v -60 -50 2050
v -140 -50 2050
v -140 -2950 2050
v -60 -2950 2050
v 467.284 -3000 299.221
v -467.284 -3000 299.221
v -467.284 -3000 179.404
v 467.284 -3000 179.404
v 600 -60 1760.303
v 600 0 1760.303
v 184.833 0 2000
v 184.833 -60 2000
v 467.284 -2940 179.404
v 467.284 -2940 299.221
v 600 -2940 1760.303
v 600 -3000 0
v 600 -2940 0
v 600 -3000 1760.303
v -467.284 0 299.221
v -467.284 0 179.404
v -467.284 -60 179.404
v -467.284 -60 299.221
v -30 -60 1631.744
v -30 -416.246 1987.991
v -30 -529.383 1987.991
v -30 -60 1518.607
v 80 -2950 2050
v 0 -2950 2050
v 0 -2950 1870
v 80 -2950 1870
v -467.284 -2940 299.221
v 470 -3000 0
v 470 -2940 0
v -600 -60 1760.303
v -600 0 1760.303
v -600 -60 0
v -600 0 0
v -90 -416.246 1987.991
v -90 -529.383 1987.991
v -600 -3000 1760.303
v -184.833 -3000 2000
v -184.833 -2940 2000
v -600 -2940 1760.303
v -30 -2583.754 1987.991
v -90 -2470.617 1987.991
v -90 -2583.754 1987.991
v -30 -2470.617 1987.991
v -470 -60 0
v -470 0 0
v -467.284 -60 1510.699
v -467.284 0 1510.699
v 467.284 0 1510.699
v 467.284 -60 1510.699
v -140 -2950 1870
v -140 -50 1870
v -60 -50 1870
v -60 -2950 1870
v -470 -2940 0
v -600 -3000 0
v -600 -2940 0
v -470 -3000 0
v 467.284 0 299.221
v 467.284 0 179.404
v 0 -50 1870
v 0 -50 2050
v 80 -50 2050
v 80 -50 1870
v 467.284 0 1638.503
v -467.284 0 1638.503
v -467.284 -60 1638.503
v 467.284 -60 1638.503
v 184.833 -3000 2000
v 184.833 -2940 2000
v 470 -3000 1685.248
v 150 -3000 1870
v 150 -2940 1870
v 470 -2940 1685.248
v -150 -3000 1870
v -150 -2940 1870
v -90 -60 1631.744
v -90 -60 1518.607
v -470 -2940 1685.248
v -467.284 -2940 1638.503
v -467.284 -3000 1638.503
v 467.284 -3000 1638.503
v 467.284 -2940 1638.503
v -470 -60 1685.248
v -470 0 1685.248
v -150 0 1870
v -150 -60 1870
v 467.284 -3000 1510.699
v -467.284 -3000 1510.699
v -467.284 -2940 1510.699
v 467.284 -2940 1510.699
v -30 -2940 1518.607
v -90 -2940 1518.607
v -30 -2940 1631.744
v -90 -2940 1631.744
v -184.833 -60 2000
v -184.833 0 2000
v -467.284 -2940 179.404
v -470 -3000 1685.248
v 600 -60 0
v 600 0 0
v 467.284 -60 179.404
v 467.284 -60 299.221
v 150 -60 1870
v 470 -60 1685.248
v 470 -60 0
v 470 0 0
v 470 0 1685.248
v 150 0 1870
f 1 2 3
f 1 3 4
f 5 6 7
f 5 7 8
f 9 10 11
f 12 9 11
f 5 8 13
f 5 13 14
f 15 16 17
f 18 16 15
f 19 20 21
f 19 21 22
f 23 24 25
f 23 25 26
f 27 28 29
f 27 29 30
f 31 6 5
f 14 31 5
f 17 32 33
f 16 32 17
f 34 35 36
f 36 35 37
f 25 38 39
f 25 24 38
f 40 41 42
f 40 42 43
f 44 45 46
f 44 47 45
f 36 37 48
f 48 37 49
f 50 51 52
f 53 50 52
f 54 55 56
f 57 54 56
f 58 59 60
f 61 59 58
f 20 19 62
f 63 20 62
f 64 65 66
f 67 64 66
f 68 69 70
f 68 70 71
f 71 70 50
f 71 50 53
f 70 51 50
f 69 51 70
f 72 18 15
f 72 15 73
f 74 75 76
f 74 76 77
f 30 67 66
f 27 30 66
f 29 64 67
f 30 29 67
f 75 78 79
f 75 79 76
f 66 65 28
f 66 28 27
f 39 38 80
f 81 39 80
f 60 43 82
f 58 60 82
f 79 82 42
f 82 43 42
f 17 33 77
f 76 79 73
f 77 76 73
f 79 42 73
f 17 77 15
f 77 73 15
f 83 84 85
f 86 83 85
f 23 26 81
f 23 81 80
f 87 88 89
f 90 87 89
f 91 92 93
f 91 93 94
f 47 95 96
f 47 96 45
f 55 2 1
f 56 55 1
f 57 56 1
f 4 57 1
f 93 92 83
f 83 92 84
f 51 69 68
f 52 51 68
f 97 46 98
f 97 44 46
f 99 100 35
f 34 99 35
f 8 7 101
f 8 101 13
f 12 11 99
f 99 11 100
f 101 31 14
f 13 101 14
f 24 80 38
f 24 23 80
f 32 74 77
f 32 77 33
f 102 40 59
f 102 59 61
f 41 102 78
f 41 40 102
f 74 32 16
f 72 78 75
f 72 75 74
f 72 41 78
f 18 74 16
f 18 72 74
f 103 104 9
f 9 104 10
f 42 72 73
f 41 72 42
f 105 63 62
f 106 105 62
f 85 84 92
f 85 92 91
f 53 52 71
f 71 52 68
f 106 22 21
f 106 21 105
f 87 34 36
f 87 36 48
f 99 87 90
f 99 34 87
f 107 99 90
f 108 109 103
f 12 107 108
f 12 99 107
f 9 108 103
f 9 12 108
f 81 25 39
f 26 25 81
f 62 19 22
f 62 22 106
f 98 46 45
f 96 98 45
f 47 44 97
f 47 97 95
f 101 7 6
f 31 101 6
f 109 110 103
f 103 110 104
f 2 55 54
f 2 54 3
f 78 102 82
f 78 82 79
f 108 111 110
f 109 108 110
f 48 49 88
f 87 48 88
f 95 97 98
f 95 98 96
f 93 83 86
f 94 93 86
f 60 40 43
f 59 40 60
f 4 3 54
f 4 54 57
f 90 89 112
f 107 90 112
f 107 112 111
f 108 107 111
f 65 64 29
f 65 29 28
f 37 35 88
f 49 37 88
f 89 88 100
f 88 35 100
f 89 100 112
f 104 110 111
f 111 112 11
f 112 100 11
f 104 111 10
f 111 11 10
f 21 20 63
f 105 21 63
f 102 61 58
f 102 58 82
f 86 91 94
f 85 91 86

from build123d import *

# Parameters (mm, degrees)
F1_DEPTH  = 60
F4_DEPTH  = 60
F6_START  = 50
F5_W      = 80
F5_H      = 180
F6_DEPTH  = 2900
F7_W      = 934.5689117908
F7_H      = 127.8042793274
F8_DEPTH  = 60
F7_H_2    = 119.8165267706
F9_W      = 934.5689117908
F9_H      = 127.8042793274
F10_DEPTH = 60
F9_H_2    = 119.8165267706
F12_DEPTH = 30


with BuildPart() as f1:
    # F0 (on Front) → F1 (new body)
    with BuildSketch(Plane.XZ):
        Polygon((0, 2000), (-184.833395016, 2000), (-600, 1760.303448854), (-600, 0), (-470, 0), (-470, 1685.2479138593), (-150, 1870), (0, 1870), (150, 1870), (470, 1685.2479138593), (470, 0), (600, 0), (600, 1760.303448854), (184.833395016, 2000), align=None)
    extrude(amount=F1_DEPTH)


with BuildPart() as f4:
    # F3 (on offset) → F4 (new body)
    with BuildSketch(Plane.XZ.offset(3000)):
        Polygon((-470, 1685.2479138593), (-150, 1870), (150, 1870), (470, 1685.2479138593), (470, 0), (600, 0), (600, 1760.303448854), (184.833395016, 2000), (-184.833395016, 2000), (-600, 1760.303448854), (-600, 0), (-470, 0), align=None)
    extrude(amount=-F4_DEPTH)


with BuildPart() as f6:
    # F5 (on Front) → F6 (new body)
    with BuildSketch(Plane.XZ.offset(F6_START)):
        with Locations((-100, 1960)):
            Rectangle(F5_W, F5_H)
    extrude(amount=F6_DEPTH)


with BuildPart() as f6b:
    # F5 (on Front) → F6, piece 2 (new body)
    with BuildSketch(Plane.XZ.offset(F6_START)):
        with Locations((40, 1960)):
            Rectangle(F5_W, F5_H)
    extrude(amount=F6_DEPTH)


with BuildPart() as f8:
    # F7 (on offset) → F8 (new body)
    with BuildSketch(Plane.XZ.offset(3000)):
        with Locations((1.49012e-05, 1574.6009349823)):
            Rectangle(F7_W, F7_H)
    extrude(amount=-F8_DEPTH)


with BuildPart() as f8b:
    # F7 (on offset) → F8, piece 2 (new body)
    with BuildSketch(Plane.XZ.offset(3000)):
        with Locations((1.49012e-05, 239.3123582006)):
            Rectangle(F7_W, F7_H_2)
    extrude(amount=-F8_DEPTH)


with BuildPart() as f10:
    # F9 (on Front) → F10 (new body)
    with BuildSketch(Plane.XZ):
        with Locations((1.49012e-05, 1574.6009349823)):
            Rectangle(F9_W, F9_H)
    extrude(amount=F10_DEPTH)


with BuildPart() as f10b:
    # F9 (on Front) → F10, piece 2 (new body)
    with BuildSketch(Plane.XZ):
        with Locations((1.49012e-05, 239.3123582006)):
            Rectangle(F9_W, F9_H_2)
    extrude(amount=F10_DEPTH)


with BuildPart() as f12:
    # F11 (on face) → F12 (new body, symmetric)
    with BuildSketch(Plane.YZ.offset(-60)):
        Polygon((-2583.7536616078, 1987.9906039485), (-2940, 1631.7442655563), (-2940, 1518.6071805665), (-2470.616576618, 1987.9906039485), align=None)
    extrude(amount=F12_DEPTH, both=True)


with BuildPart() as f12b:
    # F11 (on face) → F12, piece 2 (new body, symmetric)
    with BuildSketch(Plane.YZ.offset(-60)):
        Polygon((-416.2463383922, 1987.9906039485), (-529.383423382, 1987.9906039485), (-60, 1518.6071805665), (-60, 1631.7442655563), align=None)
    extrude(amount=F12_DEPTH, both=True)


solid = Compound([f1.part, f4.part, f6.part, f6b.part, f8.part, f8b.part, f10.part, f10b.part, f12.part, f12b.part])
